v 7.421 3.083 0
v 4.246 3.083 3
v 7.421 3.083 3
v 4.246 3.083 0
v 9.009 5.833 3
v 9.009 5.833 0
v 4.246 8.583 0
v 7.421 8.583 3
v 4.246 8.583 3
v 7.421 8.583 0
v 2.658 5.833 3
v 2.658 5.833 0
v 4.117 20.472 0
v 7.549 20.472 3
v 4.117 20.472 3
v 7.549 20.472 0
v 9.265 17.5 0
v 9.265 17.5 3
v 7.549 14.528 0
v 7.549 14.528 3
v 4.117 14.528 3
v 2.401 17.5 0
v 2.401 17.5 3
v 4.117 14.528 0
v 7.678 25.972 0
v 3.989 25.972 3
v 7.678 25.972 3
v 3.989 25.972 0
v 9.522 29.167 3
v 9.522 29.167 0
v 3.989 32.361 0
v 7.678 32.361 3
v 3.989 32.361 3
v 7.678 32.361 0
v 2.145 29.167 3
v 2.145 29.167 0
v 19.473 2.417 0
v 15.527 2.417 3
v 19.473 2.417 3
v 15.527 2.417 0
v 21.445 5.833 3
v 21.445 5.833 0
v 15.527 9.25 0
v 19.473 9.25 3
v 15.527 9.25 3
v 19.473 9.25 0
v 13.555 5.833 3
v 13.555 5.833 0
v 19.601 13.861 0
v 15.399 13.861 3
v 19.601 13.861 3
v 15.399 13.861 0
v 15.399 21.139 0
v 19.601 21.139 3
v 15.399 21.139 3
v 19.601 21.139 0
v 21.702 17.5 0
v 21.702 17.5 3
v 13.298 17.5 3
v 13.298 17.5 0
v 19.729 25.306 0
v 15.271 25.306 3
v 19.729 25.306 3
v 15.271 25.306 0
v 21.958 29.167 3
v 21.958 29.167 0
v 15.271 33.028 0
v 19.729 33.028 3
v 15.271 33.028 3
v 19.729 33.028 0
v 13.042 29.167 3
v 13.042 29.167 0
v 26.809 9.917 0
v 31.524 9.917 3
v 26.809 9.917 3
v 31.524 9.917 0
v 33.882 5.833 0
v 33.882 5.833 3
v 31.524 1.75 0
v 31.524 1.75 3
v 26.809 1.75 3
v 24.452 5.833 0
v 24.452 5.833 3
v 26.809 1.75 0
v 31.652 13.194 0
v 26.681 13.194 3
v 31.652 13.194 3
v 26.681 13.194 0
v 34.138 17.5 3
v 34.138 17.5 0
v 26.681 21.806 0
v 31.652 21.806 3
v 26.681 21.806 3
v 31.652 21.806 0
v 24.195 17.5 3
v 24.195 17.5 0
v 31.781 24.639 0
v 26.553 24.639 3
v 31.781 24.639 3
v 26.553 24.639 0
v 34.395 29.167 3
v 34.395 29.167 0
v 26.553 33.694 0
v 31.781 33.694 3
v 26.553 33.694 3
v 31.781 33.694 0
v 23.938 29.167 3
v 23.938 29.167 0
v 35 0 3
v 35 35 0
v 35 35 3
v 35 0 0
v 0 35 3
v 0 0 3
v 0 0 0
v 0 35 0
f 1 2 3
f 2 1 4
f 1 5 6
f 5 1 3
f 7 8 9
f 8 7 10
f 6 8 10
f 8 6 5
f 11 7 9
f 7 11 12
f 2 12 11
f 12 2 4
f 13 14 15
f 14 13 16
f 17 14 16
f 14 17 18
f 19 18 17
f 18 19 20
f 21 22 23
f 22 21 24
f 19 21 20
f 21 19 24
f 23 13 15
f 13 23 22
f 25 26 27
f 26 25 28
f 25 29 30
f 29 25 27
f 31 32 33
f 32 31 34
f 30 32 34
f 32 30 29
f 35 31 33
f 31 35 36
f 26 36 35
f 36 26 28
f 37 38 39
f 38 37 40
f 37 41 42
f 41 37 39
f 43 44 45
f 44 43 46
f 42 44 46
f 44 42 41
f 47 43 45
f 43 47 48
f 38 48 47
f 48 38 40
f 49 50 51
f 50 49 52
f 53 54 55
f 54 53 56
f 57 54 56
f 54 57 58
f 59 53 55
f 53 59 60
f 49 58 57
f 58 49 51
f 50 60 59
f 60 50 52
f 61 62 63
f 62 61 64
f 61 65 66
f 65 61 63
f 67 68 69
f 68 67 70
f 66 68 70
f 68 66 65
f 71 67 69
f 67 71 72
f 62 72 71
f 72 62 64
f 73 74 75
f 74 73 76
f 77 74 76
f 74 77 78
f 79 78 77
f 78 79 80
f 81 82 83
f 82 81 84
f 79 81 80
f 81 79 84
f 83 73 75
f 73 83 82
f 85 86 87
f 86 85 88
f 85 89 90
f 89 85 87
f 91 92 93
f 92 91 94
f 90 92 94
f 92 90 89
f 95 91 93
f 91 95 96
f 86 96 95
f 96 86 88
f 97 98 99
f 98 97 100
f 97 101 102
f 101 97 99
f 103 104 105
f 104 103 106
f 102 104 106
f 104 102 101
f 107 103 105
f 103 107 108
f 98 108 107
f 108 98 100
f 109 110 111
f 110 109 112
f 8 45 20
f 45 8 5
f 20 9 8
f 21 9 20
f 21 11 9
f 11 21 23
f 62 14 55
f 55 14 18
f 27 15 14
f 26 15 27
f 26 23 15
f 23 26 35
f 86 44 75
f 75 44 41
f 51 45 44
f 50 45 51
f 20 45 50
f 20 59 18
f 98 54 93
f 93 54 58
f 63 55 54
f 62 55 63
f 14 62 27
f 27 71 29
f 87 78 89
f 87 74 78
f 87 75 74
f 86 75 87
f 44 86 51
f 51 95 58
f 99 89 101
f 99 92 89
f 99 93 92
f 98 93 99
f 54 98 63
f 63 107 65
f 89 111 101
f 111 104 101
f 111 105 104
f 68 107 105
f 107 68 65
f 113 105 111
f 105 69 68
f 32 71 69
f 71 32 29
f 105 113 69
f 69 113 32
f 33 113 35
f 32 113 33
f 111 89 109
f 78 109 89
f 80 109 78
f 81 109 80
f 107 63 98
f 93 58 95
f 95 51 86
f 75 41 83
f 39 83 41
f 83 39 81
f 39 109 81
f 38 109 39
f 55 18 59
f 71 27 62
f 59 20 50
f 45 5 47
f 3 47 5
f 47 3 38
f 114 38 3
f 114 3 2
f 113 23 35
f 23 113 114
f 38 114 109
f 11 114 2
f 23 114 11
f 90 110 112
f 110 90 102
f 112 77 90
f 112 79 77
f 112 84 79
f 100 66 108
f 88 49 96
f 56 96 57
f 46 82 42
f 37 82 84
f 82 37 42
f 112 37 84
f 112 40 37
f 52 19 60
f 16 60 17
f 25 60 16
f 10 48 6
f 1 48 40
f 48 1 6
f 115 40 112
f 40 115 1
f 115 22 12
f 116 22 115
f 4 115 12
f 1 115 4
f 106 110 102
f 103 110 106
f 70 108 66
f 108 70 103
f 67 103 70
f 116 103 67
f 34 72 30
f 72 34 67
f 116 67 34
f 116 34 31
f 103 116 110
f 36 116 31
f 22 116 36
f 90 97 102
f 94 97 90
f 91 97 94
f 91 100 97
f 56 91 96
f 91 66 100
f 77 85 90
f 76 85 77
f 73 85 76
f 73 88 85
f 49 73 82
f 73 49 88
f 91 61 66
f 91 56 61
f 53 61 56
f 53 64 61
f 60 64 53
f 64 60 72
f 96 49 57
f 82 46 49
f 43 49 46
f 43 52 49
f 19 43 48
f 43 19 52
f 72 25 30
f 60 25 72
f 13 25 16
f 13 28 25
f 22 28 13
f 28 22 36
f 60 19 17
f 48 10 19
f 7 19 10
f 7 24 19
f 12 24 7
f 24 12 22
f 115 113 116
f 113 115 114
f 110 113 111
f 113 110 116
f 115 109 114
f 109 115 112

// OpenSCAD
wide=35;
thick = 3;
deep = 4;
places = 3;
step = wide / (places);
holerange=2;
hole_start=2.75;

 module cylinder_outer(height,radius,fn){
   fudge = 1/cos(180/fn);
   cylinder(h=height,r=radius*fudge,$fn=fn);
}

difference () {
    cube ([wide, wide, thick]);
    holestep = holerange / (places * places);
    for (x = [0:places - 1]) {
        for (y = [0:places -1]) {
            rad = hole_start + (x * (places) + y) * holestep;
            echo (x, y, rad);
            translate ([ (x + 0.5) * step, (y + 0.5) * step, thick - deep + 0.01]) cylinder_outer(radius=rad , height = deep, fn=6); 
        }
    }
}
